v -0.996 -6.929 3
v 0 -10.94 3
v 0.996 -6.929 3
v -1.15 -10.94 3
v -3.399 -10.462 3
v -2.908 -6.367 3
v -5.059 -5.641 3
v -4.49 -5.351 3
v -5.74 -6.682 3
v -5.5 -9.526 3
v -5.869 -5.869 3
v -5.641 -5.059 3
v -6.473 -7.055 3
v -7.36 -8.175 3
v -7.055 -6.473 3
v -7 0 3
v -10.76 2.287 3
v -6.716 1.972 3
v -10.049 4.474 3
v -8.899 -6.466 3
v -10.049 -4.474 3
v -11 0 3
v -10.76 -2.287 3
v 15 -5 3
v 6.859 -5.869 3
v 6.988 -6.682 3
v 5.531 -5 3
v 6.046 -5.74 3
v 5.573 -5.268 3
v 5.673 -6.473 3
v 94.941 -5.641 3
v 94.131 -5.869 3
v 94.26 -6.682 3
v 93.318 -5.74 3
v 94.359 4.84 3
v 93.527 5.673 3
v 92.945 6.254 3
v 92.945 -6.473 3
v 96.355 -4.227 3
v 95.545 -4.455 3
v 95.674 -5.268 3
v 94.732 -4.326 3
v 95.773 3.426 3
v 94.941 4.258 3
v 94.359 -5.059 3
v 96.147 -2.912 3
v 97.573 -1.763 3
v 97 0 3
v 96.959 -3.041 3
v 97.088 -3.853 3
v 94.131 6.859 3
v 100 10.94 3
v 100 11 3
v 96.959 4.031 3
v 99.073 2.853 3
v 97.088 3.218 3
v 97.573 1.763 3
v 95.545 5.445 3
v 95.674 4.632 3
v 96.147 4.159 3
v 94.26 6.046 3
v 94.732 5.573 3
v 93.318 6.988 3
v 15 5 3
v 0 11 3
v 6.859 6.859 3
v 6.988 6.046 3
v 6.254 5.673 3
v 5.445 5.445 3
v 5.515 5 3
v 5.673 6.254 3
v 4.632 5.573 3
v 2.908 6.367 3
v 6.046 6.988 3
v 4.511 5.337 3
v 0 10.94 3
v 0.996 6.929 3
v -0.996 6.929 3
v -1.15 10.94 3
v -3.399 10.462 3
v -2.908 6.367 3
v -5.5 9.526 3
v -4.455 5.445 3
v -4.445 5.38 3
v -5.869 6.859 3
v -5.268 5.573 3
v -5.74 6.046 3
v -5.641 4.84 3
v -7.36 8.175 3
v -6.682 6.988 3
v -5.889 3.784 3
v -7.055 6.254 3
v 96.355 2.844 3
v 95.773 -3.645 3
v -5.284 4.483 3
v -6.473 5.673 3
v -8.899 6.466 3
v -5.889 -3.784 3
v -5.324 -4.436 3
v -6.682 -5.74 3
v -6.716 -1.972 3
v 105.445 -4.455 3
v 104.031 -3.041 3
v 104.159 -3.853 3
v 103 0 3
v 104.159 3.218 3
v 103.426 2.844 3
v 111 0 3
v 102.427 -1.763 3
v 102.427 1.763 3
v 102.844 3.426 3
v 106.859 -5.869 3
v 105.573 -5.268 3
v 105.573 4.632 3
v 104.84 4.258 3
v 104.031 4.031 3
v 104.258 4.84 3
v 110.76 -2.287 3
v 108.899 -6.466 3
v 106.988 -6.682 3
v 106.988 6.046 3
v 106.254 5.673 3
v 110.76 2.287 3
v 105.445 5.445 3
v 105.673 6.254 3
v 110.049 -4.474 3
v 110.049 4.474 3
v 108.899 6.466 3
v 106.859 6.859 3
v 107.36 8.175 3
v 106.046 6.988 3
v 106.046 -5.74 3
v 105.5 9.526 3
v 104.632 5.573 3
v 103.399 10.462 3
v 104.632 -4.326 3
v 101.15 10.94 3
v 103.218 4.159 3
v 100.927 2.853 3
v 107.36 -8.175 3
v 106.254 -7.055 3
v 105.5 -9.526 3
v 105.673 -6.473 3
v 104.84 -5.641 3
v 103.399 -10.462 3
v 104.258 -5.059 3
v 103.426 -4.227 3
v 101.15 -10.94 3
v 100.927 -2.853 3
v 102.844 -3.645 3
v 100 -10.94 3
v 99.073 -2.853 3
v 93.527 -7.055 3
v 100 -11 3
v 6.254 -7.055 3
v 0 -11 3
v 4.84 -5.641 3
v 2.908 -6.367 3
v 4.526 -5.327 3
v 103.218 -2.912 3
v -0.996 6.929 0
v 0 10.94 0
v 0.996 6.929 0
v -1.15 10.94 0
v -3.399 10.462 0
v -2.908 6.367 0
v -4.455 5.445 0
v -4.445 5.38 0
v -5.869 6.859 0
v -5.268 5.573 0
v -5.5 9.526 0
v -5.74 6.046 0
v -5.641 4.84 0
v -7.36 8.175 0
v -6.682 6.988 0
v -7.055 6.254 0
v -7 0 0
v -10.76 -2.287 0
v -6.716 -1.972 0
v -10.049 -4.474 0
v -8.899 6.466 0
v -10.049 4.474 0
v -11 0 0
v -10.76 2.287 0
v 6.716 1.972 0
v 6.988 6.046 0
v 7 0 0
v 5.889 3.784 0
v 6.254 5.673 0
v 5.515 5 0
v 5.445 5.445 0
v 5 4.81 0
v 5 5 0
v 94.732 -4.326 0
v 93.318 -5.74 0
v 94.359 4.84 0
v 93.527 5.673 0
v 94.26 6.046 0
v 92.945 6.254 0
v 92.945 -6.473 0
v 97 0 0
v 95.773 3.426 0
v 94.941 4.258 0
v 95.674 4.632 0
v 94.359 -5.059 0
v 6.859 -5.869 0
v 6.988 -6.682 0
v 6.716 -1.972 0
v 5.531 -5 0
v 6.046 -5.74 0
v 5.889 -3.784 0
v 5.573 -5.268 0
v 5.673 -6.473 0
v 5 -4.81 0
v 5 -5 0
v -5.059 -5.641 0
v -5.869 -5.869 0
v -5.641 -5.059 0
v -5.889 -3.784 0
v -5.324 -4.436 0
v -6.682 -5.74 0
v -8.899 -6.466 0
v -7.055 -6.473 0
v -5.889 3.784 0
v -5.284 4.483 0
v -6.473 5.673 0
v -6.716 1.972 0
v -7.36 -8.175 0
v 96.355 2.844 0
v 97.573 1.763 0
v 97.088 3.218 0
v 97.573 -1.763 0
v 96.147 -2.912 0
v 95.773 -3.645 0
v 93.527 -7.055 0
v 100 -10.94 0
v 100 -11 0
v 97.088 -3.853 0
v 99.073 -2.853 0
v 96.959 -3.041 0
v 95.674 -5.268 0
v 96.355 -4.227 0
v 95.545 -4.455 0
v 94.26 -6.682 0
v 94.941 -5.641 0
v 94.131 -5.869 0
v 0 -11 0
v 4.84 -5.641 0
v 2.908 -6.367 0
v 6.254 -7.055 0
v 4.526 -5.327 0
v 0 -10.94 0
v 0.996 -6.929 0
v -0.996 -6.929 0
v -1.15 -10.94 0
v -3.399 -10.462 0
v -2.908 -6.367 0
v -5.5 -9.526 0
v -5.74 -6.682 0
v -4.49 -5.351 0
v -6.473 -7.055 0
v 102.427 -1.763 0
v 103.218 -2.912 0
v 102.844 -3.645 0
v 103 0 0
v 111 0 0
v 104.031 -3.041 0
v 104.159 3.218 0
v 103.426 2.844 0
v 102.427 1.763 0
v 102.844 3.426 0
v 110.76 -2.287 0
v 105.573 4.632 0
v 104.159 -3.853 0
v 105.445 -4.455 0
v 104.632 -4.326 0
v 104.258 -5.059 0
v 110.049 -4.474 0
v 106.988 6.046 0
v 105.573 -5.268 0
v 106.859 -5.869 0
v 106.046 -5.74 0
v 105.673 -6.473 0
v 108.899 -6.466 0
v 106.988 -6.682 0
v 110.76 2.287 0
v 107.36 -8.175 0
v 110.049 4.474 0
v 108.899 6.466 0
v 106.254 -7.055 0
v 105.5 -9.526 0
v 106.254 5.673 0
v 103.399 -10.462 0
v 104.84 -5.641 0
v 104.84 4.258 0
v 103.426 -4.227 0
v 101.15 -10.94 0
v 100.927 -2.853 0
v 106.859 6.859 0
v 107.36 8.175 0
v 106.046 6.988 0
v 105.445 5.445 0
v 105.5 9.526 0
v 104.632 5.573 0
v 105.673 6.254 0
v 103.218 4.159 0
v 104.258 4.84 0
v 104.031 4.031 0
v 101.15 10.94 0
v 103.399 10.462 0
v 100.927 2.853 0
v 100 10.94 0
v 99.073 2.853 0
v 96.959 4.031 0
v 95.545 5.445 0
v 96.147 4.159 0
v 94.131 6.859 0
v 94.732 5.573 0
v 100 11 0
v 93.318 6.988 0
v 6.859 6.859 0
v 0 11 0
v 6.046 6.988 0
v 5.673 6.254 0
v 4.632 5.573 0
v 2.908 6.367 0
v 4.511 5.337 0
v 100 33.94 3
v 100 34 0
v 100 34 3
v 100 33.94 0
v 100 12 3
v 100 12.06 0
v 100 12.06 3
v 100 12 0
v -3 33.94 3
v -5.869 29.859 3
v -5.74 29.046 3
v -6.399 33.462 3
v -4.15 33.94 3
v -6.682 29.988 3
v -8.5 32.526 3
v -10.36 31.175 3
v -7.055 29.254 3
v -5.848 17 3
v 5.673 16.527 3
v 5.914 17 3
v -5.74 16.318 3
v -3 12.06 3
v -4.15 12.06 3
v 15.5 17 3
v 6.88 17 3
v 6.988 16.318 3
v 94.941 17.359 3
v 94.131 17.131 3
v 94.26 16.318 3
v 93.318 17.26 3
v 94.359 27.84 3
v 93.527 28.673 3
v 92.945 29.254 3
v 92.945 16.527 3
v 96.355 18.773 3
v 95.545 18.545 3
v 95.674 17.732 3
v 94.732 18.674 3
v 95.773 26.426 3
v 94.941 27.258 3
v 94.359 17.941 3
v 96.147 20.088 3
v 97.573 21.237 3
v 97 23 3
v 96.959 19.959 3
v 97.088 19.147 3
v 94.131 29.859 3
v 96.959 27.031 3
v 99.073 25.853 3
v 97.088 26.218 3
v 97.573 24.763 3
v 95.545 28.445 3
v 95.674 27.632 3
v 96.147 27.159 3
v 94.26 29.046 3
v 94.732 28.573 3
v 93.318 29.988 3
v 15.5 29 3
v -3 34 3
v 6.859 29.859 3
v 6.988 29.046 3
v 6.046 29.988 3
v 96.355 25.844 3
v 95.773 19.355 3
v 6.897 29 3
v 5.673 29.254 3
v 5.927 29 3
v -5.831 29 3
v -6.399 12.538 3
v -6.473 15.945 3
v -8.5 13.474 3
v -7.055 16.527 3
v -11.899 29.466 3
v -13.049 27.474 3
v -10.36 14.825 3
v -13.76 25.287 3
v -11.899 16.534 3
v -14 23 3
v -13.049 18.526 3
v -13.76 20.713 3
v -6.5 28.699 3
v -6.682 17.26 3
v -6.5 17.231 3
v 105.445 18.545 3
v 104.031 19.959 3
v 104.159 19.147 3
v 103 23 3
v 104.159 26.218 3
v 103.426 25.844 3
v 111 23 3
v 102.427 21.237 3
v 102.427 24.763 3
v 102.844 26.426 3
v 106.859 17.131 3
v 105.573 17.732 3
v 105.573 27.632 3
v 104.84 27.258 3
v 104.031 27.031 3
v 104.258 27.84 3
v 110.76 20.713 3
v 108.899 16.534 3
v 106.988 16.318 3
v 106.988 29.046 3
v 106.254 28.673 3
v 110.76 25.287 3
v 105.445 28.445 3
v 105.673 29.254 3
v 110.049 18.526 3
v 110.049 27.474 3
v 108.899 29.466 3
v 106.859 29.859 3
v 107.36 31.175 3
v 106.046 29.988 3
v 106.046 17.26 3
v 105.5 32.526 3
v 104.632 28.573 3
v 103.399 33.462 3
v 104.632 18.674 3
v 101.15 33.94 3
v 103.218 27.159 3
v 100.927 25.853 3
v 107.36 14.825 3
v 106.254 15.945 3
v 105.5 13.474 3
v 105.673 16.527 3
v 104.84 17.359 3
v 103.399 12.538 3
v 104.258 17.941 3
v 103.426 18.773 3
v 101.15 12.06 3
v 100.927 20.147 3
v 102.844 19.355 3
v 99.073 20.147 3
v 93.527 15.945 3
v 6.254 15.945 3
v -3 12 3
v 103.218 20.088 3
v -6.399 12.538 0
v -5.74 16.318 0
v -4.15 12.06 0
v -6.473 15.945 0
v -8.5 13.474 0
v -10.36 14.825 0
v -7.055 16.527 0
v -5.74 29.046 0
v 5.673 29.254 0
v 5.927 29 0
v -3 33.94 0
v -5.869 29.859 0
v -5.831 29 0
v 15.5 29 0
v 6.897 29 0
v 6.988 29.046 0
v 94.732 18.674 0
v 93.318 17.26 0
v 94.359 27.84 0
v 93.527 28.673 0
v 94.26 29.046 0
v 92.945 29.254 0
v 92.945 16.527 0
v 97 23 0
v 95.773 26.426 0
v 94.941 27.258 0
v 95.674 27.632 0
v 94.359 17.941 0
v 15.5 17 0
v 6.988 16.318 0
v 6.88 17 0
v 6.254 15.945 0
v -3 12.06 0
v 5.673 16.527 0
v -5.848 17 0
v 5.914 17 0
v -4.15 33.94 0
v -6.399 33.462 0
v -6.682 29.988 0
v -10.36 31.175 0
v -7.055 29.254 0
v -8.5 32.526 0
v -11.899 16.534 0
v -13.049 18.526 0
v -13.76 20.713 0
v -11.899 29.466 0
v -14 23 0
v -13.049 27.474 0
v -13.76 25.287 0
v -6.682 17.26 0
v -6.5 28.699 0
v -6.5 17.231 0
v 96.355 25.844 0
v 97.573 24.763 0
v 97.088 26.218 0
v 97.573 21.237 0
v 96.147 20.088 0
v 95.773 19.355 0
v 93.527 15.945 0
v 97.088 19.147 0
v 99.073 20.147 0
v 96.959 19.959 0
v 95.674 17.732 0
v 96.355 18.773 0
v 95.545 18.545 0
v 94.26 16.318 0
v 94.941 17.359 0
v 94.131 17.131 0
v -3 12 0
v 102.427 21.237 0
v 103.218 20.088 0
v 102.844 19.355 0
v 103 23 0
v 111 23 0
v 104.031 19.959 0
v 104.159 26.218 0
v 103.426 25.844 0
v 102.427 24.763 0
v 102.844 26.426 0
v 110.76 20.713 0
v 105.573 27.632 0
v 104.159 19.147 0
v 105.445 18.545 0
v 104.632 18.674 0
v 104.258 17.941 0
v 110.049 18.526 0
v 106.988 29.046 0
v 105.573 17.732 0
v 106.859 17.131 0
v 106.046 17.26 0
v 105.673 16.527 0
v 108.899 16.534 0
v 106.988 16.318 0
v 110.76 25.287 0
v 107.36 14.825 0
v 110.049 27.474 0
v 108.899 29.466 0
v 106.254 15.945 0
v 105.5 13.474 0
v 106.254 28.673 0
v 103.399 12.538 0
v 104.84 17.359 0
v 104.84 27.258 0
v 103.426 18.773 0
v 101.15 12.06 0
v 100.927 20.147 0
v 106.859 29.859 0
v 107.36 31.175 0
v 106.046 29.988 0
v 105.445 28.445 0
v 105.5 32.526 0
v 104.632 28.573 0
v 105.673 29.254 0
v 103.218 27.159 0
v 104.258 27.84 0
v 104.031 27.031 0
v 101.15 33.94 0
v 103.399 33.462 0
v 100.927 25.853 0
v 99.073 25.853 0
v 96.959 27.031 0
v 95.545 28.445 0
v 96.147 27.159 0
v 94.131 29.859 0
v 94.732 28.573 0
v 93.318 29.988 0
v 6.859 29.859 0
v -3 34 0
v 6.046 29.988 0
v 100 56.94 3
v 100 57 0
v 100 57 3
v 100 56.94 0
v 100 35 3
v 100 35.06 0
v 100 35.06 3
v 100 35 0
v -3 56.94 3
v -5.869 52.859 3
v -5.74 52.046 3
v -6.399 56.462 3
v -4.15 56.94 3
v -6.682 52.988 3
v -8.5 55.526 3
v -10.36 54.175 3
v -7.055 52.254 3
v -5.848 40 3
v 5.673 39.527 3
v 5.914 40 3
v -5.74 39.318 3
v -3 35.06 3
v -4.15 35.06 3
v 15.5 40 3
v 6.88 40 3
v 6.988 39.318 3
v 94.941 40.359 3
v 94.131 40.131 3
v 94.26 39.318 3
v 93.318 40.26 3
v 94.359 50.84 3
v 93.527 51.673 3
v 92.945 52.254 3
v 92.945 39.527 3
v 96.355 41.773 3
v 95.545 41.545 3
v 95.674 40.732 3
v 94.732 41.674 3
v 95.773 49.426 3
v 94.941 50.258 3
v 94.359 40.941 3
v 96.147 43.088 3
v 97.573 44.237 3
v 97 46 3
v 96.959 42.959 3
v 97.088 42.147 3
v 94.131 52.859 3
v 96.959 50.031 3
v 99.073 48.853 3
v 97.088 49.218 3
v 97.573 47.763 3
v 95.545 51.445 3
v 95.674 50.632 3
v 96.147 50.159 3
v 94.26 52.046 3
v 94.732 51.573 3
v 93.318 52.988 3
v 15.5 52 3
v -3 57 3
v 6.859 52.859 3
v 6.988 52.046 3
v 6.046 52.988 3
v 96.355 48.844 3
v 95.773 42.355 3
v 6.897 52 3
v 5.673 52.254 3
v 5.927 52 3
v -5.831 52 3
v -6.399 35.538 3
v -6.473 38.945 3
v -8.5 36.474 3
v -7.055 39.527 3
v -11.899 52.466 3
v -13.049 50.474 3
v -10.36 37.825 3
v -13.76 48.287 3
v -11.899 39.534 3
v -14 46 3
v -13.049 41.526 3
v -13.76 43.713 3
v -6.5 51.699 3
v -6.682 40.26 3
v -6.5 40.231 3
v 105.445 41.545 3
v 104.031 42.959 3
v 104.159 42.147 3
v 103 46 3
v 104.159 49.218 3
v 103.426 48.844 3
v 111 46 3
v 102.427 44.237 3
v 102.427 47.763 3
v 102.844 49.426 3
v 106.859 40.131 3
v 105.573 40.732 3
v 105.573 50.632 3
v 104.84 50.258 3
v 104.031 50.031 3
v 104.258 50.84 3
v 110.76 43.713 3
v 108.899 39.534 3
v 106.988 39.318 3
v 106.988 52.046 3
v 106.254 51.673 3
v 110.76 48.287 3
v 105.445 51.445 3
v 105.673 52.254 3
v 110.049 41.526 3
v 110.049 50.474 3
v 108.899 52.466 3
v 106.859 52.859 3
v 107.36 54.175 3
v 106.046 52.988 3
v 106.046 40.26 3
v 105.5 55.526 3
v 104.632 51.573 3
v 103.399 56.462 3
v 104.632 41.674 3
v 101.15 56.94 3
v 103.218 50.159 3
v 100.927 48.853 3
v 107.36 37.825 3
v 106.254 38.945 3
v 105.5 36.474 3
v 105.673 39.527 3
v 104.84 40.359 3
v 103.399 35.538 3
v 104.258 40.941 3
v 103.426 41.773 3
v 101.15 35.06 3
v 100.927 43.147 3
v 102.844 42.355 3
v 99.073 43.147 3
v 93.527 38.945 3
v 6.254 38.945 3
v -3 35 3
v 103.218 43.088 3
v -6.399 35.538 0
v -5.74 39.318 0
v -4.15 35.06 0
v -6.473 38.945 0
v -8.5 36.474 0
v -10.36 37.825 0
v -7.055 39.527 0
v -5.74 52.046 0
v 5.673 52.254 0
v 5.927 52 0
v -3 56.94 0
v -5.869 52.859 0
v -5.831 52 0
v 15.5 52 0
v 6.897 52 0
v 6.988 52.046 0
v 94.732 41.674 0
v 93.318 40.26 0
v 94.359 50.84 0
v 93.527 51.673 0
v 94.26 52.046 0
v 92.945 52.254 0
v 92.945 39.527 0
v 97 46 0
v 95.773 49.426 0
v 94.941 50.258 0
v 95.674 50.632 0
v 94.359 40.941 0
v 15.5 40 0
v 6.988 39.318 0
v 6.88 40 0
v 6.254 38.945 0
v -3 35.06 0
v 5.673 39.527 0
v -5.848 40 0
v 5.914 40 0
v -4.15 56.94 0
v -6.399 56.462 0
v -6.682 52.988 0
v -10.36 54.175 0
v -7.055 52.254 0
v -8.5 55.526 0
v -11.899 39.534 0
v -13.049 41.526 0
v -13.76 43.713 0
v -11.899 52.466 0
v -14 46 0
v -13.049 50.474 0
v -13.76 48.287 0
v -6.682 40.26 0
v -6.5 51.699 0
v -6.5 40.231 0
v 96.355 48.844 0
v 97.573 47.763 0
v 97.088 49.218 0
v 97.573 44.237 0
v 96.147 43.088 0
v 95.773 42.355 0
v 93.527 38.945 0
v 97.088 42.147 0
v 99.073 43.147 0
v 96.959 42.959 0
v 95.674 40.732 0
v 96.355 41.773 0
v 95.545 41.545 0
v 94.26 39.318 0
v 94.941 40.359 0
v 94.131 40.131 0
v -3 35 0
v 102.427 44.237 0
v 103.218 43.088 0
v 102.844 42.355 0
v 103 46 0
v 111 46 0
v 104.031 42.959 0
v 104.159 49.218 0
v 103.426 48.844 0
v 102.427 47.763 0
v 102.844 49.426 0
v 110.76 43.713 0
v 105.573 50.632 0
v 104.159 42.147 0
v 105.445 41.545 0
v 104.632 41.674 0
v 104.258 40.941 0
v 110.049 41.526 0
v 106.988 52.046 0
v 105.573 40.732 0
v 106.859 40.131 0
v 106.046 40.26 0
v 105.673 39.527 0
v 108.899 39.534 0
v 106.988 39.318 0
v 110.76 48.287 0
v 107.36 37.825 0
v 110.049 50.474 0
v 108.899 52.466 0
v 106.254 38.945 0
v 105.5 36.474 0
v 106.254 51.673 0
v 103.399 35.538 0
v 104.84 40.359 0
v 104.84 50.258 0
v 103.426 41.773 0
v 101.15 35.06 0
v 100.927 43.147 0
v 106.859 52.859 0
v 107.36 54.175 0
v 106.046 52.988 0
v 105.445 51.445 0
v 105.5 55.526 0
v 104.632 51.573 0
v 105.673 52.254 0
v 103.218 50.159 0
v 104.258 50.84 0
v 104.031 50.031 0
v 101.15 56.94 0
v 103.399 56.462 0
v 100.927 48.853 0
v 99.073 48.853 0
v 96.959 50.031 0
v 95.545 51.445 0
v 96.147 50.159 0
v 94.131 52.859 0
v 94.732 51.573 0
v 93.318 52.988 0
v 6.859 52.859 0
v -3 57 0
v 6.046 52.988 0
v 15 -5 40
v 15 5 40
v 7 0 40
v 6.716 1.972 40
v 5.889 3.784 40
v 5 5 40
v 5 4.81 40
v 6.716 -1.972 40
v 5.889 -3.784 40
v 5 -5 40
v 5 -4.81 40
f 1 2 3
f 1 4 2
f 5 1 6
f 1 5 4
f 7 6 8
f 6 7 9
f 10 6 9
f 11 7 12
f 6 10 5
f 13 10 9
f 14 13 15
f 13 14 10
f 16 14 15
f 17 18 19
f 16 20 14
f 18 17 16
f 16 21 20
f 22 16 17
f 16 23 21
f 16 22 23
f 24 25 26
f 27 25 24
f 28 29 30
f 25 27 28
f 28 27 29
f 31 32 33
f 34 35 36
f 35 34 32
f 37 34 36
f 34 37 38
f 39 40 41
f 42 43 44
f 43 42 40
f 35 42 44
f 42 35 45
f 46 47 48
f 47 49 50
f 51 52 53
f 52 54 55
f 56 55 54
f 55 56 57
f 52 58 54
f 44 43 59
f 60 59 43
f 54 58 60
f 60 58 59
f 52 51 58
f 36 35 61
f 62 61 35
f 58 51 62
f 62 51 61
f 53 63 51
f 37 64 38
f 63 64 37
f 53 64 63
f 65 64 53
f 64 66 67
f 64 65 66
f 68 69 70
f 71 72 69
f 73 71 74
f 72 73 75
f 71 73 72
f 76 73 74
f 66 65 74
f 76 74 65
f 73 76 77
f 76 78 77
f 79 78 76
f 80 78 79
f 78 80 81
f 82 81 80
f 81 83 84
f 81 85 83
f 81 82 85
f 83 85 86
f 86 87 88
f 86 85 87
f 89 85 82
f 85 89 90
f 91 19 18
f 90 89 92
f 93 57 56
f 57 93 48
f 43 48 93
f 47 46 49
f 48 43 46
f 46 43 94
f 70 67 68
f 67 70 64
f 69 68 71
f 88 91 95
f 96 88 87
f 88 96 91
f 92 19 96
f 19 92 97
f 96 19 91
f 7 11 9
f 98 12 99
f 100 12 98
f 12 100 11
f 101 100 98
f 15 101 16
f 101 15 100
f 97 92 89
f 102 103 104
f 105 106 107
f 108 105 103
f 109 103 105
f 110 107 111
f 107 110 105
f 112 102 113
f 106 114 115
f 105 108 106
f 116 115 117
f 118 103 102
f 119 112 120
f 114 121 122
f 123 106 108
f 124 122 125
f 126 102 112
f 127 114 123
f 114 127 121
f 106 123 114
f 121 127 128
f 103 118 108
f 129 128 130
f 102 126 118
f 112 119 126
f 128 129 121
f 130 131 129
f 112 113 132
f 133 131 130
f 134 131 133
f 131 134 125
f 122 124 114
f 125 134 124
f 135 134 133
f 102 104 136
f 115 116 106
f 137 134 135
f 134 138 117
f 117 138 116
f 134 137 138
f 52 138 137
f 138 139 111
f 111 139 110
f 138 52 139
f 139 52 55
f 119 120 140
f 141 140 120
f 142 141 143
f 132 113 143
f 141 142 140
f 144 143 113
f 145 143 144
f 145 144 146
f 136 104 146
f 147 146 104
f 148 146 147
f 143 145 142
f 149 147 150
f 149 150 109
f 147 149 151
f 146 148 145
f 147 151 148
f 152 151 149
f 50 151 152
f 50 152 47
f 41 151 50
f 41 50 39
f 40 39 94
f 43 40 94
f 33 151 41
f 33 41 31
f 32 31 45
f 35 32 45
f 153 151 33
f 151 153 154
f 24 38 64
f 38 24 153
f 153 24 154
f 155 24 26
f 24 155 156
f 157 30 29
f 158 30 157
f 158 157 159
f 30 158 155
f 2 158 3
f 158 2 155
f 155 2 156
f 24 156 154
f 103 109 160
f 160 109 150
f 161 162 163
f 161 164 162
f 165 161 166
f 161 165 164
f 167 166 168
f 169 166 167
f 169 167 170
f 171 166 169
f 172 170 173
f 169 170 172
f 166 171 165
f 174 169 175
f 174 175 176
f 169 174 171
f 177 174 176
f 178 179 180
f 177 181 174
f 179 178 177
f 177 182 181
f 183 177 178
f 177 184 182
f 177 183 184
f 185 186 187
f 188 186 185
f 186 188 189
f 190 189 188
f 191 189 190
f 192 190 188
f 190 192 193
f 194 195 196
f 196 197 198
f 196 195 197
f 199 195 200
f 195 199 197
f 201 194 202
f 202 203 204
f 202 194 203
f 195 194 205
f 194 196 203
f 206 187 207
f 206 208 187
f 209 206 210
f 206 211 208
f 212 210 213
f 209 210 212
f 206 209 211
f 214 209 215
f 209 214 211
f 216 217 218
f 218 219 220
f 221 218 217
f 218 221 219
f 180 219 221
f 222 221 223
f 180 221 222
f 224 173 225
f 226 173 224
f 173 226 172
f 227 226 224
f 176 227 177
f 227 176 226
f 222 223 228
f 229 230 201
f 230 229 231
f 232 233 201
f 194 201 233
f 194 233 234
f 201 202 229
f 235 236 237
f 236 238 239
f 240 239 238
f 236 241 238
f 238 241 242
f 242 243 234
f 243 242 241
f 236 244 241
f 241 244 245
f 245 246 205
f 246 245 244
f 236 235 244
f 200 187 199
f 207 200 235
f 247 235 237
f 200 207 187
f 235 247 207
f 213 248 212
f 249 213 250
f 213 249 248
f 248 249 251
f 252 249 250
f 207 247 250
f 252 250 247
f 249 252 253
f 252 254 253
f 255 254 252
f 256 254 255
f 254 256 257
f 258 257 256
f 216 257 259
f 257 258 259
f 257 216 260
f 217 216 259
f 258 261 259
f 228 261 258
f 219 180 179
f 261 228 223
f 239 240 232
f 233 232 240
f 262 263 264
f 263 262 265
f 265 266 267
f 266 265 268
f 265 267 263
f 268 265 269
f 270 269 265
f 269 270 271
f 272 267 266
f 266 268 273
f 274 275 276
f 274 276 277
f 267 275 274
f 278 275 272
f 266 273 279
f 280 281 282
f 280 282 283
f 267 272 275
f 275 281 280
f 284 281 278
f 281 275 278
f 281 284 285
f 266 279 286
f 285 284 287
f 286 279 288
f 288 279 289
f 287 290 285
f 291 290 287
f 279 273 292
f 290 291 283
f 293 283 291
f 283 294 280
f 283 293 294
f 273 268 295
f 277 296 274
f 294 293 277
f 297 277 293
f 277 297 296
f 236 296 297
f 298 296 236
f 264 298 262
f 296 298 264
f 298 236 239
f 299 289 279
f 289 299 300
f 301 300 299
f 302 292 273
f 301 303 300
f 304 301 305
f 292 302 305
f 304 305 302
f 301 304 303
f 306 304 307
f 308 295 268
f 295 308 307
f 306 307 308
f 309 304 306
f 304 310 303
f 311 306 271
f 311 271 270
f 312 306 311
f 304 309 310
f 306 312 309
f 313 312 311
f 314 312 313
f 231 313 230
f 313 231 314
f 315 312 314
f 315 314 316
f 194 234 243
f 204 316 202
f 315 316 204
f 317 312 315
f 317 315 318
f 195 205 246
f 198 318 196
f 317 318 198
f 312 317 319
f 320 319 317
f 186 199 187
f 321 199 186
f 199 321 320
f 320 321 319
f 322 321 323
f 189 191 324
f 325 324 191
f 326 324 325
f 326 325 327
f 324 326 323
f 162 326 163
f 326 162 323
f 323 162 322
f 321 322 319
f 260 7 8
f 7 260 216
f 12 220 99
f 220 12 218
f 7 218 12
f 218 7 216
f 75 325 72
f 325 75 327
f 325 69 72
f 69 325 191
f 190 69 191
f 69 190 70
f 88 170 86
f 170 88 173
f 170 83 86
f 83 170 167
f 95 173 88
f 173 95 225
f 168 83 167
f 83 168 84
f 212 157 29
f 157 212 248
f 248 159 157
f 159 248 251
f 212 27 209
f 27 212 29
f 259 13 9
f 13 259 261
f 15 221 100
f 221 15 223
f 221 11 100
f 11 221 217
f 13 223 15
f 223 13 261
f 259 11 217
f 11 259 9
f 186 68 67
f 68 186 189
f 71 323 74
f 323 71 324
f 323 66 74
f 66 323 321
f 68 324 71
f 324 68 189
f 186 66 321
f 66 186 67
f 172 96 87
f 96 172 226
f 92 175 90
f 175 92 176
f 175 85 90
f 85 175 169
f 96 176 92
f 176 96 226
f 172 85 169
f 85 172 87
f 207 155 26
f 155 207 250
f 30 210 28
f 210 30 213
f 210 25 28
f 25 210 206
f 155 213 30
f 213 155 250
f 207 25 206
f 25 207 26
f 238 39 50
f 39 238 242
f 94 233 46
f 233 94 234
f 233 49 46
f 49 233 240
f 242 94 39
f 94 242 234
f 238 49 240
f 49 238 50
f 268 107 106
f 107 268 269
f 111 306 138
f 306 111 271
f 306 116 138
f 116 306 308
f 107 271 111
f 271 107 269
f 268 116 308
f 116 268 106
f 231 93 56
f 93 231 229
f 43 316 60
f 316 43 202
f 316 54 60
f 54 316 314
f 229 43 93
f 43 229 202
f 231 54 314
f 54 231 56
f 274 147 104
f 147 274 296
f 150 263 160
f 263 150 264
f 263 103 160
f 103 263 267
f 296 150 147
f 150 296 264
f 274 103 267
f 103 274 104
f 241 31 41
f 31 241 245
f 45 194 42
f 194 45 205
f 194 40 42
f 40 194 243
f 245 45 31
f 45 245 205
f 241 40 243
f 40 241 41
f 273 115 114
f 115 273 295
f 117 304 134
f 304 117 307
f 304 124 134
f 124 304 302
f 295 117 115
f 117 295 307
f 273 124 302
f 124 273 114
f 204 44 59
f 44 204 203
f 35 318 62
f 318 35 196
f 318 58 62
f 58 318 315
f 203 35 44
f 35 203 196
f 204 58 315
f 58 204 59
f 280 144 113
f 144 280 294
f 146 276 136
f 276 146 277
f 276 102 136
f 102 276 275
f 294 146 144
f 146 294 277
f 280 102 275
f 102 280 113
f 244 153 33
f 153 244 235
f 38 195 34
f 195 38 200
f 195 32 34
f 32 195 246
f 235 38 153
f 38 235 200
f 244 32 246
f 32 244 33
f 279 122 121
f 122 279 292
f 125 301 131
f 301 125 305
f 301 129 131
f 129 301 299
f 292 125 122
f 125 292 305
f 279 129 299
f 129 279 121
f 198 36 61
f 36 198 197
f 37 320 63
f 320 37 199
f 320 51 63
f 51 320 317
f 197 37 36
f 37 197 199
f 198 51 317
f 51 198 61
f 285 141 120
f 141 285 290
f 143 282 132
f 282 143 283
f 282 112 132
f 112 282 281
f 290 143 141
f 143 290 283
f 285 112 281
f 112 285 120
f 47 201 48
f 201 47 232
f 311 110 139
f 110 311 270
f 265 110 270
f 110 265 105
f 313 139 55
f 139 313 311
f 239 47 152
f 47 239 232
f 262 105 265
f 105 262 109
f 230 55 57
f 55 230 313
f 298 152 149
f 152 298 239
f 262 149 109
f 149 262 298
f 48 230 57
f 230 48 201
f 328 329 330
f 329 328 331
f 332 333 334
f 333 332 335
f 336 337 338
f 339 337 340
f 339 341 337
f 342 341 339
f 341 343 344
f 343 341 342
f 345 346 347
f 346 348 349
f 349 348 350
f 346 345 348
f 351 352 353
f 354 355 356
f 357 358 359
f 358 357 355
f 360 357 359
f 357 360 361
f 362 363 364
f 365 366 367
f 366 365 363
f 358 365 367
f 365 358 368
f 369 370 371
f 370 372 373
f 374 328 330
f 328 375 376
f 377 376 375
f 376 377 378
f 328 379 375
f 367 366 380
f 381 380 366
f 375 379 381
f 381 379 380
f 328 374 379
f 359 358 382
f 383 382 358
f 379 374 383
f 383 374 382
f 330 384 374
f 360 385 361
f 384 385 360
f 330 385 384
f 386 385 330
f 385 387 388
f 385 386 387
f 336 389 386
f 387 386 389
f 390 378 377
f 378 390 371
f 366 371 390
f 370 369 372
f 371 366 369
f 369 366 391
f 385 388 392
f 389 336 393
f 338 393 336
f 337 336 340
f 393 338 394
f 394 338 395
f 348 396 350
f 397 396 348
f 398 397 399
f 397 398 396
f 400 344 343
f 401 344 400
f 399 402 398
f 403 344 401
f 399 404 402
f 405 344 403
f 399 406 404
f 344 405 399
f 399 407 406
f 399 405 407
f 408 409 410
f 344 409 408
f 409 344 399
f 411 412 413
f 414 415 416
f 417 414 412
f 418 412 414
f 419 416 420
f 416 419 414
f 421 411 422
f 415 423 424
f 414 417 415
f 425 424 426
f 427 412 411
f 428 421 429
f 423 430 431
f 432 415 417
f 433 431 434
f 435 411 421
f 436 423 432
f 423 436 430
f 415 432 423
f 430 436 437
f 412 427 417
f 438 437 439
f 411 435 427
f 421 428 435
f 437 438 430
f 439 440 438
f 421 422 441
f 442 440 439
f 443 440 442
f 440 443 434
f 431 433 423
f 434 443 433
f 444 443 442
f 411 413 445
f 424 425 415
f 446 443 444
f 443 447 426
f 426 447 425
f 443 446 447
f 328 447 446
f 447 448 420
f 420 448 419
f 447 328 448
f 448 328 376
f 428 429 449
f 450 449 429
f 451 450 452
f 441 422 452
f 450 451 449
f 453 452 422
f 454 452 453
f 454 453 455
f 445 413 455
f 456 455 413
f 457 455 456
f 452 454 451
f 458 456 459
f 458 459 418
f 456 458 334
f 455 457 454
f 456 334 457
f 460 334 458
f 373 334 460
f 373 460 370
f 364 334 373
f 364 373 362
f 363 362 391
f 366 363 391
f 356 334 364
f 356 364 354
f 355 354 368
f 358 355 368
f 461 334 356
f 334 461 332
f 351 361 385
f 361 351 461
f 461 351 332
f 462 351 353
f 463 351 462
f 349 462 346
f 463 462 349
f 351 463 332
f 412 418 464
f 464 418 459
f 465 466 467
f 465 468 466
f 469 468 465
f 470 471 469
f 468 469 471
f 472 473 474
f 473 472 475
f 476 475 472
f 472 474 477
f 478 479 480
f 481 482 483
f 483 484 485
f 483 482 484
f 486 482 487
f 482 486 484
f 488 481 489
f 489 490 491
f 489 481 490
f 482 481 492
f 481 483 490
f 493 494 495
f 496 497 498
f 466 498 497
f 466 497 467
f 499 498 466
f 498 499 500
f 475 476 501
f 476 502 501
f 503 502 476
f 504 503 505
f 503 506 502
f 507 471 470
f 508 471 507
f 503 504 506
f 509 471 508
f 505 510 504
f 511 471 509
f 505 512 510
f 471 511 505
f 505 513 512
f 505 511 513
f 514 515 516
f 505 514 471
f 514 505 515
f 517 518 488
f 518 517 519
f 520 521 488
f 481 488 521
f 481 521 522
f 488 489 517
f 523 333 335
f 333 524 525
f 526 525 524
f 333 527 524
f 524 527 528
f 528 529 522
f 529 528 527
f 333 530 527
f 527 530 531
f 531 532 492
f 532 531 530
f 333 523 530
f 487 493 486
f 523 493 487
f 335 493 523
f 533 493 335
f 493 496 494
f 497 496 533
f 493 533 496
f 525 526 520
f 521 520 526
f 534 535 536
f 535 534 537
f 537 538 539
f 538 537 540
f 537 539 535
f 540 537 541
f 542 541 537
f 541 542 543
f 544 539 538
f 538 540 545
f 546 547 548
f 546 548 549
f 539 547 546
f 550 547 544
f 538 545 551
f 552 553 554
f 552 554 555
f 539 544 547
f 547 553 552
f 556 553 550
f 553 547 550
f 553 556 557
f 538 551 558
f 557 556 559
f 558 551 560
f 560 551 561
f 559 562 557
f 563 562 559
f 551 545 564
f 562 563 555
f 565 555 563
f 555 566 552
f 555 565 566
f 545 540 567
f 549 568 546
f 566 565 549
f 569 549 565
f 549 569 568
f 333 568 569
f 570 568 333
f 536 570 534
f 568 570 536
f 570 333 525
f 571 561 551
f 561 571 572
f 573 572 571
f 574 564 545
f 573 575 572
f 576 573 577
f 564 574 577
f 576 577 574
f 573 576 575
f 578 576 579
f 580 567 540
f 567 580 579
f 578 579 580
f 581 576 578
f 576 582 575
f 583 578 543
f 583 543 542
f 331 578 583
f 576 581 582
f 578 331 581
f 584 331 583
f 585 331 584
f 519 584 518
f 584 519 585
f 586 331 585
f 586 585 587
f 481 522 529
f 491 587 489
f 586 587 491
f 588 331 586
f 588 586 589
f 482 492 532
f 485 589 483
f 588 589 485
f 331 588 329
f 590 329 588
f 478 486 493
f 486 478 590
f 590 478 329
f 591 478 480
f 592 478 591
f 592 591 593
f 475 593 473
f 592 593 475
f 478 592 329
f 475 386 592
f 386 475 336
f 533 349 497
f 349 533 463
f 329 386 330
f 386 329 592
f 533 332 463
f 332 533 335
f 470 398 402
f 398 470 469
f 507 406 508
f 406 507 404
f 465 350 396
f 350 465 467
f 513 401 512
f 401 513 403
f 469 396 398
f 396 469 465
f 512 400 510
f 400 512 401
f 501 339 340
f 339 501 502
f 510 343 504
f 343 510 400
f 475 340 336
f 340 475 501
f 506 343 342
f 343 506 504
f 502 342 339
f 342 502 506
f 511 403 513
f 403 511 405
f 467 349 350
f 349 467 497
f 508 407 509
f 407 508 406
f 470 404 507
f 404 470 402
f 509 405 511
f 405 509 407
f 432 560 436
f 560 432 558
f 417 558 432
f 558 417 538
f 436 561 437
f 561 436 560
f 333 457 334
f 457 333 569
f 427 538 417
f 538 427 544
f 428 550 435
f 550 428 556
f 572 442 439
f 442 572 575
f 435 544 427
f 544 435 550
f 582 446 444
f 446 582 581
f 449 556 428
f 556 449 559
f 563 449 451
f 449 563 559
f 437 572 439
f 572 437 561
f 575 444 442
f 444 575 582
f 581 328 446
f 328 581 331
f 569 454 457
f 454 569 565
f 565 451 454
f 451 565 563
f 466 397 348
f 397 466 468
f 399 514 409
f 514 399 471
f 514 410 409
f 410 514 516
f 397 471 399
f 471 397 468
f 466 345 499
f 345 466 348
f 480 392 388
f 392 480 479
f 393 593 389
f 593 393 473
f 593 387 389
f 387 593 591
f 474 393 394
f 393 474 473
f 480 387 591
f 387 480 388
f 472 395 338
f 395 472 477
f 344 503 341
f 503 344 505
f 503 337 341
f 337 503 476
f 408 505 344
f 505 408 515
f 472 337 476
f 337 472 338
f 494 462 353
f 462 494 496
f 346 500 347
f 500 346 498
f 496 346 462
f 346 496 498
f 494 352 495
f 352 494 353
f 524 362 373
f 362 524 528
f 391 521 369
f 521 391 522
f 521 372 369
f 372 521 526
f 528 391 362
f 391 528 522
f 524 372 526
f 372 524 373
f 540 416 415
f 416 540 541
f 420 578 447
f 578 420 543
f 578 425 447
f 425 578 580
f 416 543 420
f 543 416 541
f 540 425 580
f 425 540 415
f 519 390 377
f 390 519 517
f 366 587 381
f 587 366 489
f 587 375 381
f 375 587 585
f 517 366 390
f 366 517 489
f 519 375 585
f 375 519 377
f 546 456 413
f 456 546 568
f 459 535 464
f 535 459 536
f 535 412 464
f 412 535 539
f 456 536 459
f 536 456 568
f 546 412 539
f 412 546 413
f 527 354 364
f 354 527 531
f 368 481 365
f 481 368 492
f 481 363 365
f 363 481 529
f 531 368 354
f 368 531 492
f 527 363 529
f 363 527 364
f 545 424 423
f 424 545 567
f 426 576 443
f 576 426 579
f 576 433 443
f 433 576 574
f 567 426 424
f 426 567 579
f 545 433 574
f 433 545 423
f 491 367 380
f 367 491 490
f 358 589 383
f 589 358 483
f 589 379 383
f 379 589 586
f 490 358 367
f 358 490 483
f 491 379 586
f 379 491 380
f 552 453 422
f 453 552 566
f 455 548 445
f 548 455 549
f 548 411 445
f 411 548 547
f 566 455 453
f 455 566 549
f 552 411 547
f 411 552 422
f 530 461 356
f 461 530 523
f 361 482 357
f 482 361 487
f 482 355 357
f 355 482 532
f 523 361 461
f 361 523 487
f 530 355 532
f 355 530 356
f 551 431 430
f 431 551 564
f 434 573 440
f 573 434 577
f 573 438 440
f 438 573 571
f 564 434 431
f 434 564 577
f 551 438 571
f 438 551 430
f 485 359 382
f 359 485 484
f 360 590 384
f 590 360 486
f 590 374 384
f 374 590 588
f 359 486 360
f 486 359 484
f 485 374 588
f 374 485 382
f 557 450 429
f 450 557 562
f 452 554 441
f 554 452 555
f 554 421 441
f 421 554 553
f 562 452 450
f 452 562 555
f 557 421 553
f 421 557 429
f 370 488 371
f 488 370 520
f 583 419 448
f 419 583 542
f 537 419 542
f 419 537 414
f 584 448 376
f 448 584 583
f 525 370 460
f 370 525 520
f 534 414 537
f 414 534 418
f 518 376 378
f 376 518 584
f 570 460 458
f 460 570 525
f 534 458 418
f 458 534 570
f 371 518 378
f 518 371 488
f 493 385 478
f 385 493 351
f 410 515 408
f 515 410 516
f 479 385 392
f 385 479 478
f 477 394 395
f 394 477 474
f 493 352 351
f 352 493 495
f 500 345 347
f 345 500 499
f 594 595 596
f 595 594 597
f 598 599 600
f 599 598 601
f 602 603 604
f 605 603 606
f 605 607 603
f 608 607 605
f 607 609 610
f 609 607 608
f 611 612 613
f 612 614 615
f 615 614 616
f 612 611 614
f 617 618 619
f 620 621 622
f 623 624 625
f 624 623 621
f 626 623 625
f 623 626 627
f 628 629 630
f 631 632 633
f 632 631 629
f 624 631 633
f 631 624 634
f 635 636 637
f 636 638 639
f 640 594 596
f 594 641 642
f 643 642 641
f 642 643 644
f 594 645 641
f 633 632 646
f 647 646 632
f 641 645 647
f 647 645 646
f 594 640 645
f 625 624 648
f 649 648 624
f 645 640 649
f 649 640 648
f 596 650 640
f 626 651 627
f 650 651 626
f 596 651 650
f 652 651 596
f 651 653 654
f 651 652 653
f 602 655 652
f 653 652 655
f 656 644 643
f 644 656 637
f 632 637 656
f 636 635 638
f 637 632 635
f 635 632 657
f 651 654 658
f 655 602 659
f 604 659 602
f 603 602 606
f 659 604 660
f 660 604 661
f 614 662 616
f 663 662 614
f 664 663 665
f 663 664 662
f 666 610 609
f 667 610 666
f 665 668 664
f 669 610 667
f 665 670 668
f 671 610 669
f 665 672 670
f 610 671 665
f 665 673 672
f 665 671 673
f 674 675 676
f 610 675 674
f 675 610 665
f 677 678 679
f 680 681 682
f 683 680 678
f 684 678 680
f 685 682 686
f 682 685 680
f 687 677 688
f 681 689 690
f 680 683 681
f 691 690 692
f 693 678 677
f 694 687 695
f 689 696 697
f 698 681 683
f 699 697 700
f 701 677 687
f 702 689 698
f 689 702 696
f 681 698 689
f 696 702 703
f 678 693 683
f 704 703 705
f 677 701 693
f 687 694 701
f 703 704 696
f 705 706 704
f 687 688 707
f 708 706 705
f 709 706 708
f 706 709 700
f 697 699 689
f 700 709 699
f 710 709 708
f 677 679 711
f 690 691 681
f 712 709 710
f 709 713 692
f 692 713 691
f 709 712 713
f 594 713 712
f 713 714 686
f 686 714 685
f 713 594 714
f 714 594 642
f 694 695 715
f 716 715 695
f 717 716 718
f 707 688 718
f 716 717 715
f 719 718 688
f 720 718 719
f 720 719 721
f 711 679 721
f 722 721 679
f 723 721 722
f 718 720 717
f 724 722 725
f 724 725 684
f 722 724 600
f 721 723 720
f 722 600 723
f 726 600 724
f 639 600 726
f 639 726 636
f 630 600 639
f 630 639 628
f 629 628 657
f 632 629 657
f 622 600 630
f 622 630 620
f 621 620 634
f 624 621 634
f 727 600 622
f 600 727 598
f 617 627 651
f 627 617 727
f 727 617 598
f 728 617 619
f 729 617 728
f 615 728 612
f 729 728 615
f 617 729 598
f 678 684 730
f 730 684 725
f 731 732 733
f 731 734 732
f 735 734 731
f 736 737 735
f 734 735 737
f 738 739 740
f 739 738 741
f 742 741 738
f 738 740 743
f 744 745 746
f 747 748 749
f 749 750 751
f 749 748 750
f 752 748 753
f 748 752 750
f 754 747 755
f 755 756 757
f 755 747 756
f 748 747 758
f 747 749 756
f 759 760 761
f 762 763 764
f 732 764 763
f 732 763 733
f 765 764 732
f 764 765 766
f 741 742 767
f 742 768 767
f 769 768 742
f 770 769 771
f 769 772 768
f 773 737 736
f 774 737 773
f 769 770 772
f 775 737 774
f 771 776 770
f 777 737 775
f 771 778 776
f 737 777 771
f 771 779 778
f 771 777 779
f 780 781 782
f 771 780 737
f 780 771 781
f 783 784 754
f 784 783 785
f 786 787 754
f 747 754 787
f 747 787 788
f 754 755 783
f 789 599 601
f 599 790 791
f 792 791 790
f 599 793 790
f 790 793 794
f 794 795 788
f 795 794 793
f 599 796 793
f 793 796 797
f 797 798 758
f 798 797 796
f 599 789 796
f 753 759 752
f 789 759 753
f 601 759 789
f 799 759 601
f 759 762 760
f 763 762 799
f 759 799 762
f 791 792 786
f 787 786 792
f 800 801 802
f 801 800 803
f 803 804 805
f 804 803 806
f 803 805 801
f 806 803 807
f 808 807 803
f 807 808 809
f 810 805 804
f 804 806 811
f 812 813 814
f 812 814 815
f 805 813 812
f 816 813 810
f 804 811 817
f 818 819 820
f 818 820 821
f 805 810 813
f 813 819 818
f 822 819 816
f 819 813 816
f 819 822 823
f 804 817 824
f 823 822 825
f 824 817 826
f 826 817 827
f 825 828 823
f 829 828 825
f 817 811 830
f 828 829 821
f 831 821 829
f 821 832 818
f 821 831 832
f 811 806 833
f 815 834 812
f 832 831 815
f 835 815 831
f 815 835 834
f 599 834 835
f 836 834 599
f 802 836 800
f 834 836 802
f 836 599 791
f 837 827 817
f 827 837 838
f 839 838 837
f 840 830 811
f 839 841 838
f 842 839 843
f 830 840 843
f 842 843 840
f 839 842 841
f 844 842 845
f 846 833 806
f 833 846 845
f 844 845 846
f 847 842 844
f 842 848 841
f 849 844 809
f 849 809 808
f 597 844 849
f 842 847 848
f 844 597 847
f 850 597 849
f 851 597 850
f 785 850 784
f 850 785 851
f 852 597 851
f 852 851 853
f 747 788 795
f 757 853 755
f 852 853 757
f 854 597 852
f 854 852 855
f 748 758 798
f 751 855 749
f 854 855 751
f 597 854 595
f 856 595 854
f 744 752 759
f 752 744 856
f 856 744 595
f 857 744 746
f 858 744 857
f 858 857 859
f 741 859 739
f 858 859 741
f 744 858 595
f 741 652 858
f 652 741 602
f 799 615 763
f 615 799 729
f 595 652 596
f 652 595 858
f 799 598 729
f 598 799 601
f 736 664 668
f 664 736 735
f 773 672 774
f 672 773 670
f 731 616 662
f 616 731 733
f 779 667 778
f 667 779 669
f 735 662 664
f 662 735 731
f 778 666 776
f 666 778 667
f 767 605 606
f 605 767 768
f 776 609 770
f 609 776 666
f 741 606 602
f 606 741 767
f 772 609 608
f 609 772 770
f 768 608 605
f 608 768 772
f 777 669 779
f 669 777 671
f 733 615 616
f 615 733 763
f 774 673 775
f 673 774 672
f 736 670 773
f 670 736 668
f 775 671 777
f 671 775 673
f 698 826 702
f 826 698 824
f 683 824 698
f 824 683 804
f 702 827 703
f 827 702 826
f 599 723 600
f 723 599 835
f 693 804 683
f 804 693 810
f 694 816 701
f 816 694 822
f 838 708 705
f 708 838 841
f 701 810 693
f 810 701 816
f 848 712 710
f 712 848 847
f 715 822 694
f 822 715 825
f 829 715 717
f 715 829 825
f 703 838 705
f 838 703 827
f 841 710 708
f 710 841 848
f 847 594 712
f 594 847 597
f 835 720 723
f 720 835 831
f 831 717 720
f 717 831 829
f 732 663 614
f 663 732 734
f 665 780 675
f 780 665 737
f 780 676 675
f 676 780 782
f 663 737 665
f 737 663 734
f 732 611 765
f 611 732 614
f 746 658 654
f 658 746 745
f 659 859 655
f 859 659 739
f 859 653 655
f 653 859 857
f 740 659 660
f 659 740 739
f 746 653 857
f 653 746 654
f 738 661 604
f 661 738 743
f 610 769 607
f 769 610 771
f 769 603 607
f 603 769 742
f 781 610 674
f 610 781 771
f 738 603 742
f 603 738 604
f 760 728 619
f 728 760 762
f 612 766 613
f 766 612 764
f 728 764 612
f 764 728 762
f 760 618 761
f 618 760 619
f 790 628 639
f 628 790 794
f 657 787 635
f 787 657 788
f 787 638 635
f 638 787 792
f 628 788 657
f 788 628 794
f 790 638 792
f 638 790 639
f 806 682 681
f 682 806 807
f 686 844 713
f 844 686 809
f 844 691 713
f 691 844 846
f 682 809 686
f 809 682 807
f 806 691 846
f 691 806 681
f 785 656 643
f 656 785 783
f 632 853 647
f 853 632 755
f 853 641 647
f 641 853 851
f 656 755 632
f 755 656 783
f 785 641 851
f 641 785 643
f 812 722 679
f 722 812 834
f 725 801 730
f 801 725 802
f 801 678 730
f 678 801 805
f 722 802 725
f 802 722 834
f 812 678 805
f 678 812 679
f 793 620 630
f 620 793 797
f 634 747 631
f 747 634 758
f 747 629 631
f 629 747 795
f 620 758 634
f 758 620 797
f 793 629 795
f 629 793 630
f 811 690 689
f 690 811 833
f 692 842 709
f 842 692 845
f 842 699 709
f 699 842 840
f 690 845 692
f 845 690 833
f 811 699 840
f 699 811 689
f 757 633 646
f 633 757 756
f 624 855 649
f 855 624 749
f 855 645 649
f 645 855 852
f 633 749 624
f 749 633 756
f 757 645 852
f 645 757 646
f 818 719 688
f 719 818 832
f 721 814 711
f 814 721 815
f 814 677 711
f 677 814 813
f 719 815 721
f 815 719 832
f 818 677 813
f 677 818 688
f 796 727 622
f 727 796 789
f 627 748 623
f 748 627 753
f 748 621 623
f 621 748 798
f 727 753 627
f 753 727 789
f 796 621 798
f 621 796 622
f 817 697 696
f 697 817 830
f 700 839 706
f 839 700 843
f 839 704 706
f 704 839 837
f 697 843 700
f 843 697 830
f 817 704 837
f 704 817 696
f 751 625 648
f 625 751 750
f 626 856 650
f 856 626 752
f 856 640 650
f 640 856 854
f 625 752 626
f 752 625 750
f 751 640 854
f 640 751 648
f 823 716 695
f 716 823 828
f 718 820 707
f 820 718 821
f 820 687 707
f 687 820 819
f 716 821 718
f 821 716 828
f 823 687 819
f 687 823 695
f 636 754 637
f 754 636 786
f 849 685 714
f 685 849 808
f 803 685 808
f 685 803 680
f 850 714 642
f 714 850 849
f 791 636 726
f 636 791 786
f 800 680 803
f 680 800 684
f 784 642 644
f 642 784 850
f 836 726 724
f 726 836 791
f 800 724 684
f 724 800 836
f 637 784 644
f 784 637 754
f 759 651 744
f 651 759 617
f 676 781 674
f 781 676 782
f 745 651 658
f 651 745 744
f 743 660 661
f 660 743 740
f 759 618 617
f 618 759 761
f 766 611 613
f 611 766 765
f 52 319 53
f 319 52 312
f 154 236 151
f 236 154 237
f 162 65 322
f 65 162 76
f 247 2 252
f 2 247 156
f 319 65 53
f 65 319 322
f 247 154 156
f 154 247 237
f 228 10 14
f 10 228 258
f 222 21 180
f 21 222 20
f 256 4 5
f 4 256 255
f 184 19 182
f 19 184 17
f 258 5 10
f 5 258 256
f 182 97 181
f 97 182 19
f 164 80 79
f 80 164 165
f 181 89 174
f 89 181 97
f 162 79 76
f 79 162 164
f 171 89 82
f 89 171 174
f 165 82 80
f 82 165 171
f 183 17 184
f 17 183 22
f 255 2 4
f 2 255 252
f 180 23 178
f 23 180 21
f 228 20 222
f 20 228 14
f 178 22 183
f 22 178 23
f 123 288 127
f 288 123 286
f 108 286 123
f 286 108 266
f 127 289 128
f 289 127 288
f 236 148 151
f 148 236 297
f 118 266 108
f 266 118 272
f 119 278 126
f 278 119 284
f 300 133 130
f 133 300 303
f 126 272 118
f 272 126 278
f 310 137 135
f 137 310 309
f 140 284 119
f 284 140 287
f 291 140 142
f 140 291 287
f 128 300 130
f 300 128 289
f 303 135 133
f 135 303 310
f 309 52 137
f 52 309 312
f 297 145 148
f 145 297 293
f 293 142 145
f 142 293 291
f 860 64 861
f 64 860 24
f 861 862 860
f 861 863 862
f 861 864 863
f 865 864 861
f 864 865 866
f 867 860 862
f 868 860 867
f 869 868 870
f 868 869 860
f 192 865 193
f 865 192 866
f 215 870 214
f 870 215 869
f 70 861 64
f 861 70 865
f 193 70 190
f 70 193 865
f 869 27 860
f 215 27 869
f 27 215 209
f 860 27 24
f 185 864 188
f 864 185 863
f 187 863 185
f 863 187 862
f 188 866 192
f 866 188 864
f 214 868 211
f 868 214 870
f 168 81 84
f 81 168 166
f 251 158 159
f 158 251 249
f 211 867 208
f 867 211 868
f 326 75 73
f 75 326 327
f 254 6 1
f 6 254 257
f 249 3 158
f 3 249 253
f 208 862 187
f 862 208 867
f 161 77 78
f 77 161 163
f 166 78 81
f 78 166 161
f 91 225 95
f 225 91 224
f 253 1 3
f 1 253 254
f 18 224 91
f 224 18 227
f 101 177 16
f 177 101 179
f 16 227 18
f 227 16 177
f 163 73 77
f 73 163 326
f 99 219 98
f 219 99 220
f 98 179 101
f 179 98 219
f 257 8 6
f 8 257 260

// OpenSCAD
//b();
//translate([0, -23, 0]) s1();
//translate([0, -46, 0]) s1();

// 3 segments with joint separated by 100mm (the longest for my printer)
translate([0, 23, 0]) s2();
translate([0, 46, 0]) s2();
s3();


//base with holes for horn on each side
module b(l=100,w=22,e0=0,e1=0) {
    difference(){
        union() {
            translate([-e0,-w/2,0]) cube([l+e0+e1,w,3]);
            translate([-e0,0,0]) cylinder(r=w/2, h=3);
            translate([l+e1,0,0]) cylinder(r=w/2, h=3);
        }
        holes();
        translate([l,0,0]) holes();
    }
}

//module with holes for a mini servo
module s2() {
    difference(){
        b(e0=3);
        translate([-6.5,-12/2,0]) cube([22,12,3]);
    }
}

//module with pen holder
module s3() {
    difference(){
        union(){
            b();
            translate([5,-5,0]) cube([10,10,40]);
        }
        cylinder(r=7, h=40);
    }
}

//holes for servo horn
module holes() {
    union() {
        cylinder(r=3, h=3);
        rotate([0,0,45]) for( i = [5,7,9] ) {
            translate([-i, 0,0]) cylinder(r=0.7, h=3);
            translate([ i, 0,0]) cylinder(r=0.7, h=3);
            translate([ 0, i,0]) cylinder(r=0.7, h=3);
            translate([ 0,-i,0]) cylinder(r=0.7, h=3);
        }
    }
}

module s1() {
    difference(){
        b(e0=4);
        translate([-8,-13/2,0]) cube([24,13,3]);
    }
}
